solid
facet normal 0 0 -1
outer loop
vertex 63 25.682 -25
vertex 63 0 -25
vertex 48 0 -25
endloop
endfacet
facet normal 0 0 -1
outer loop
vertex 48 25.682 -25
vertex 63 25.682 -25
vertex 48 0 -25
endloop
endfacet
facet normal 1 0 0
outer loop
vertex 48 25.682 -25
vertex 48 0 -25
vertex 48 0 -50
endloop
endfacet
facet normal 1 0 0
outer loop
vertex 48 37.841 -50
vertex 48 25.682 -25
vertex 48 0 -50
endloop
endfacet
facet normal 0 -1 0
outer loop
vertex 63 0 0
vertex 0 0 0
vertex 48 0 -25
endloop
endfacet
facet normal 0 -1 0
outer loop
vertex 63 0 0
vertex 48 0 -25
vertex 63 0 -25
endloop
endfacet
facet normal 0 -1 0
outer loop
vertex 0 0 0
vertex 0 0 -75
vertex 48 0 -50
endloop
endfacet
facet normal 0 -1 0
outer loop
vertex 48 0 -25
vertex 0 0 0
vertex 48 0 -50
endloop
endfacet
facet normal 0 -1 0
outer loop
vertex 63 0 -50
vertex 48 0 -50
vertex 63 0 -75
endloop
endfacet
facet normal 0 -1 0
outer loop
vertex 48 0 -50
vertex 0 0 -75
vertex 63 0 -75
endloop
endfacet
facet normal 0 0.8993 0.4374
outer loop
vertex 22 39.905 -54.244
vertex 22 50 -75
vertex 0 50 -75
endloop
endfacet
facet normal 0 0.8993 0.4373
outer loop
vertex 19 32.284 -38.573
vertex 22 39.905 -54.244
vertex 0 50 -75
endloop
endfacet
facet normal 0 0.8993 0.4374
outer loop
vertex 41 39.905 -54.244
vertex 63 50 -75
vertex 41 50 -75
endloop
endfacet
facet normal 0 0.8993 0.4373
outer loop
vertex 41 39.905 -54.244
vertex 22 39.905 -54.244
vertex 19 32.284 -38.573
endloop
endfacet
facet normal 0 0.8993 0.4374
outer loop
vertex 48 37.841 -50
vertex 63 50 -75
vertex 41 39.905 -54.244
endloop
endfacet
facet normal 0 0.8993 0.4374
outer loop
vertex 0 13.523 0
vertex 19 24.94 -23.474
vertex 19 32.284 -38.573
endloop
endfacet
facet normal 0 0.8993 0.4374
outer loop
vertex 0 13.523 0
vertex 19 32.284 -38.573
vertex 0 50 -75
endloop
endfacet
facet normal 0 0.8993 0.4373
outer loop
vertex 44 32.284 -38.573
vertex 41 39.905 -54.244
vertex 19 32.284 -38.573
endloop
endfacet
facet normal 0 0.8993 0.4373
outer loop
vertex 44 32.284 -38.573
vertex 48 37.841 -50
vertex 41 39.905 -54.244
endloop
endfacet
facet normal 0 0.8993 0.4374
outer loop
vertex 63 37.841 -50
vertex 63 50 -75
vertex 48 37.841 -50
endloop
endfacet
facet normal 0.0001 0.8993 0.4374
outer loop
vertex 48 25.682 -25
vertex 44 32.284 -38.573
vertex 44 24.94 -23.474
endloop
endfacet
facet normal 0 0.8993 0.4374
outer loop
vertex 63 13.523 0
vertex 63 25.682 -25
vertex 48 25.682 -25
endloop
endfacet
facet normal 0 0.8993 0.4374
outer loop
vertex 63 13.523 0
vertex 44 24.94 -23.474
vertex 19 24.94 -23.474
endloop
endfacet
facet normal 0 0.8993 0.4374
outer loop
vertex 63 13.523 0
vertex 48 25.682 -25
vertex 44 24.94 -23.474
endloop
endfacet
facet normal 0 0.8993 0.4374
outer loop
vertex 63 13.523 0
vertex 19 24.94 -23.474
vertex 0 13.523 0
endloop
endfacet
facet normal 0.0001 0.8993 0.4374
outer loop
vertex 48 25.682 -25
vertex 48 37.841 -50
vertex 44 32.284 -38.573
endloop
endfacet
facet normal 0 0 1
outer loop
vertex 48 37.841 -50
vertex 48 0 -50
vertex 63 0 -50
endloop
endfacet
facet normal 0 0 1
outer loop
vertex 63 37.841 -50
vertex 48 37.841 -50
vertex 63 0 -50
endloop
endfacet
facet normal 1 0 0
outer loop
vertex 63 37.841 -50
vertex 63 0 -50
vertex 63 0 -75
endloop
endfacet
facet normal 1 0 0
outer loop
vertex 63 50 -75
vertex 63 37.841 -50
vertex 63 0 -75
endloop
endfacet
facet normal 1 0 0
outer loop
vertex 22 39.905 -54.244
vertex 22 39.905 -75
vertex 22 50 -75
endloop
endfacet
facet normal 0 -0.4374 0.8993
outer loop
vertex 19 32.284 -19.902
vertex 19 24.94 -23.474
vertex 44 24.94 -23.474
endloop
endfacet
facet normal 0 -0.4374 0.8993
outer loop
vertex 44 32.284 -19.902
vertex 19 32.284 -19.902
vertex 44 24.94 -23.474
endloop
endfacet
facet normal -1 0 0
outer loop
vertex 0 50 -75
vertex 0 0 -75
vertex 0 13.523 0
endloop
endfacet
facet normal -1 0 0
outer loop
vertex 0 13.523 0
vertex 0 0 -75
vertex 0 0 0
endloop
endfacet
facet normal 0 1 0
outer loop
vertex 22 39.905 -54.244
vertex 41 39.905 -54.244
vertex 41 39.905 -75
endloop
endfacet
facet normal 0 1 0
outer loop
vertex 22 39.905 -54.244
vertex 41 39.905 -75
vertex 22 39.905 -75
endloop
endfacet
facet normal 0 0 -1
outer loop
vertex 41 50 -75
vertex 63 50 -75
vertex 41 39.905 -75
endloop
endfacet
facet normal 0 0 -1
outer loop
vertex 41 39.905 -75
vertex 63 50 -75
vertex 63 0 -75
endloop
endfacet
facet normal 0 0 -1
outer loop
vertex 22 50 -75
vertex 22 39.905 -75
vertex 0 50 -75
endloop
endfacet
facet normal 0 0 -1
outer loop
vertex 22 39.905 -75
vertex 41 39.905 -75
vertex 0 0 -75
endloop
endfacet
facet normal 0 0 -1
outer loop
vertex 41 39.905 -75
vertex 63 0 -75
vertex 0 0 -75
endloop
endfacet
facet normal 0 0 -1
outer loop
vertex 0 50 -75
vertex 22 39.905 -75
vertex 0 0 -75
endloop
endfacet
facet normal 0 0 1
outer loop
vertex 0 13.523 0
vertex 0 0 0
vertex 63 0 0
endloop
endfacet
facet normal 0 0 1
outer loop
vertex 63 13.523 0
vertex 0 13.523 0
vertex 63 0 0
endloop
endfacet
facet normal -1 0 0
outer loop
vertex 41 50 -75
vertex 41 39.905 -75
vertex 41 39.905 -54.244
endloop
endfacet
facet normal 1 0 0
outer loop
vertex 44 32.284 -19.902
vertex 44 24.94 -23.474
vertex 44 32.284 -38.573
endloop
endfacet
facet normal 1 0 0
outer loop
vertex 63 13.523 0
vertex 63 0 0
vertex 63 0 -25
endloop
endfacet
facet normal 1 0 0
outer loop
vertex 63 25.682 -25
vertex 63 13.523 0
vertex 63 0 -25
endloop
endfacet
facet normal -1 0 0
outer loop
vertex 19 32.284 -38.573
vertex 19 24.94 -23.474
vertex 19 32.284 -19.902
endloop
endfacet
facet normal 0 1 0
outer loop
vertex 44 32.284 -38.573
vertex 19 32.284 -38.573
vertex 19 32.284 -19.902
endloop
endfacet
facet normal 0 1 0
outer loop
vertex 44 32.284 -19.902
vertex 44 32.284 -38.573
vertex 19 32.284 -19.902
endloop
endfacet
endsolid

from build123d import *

# Parameters (mm, degrees)
BOSS_EXTRUDE2_DEPTH = 50
CUT_EXTRUDE2_DEPTH  = 63
SKETCH6_W           = 25
SKETCH6_H           = 16.790562981
BOSS_EXTRUDE4_DEPTH = 16
CUT_EXTRUDE8_DEPTH  = 25
SKETCH11_W          = 19
SKETCH11_H          = 10.094840621
CUT_EXTRUDE9_DEPTH  = 25


with BuildPart() as part:
    # Sketch1 → Boss-Extrude2 (new body)
    with BuildSketch(Plane(origin=(0, 0, 0), x_dir=(1, 0, 0), z_dir=(0, 1, 0))):
        Polygon((0, 0), (63, 0), (63, 25), (48, 25), (48, 50), (63, 50), (63, 75), (0, 75), align=None)
    extrude(amount=BOSS_EXTRUDE2_DEPTH)

    # Sketch3 → Cut-Extrude2 (cut)
    with BuildSketch(Plane(origin=(63, 0, 0), x_dir=(0, 0, -1), z_dir=(1, 0, 0))):
        Polygon((75, 50), (0, 13.523152522), (0, 50), align=None)
    extrude(amount=-CUT_EXTRUDE2_DEPTH, mode=Mode.SUBTRACT)

    # Sketch6 → Boss-Extrude4 (add)
    with BuildSketch(Plane(origin=(0, 10.936247914, 5.318931295), x_dir=(1, 0, 0), z_dir=(0, 0.8992805495570562, 0.437372259280763))):
        with Locations((31.5, 40.412961178)):
            Rectangle(SKETCH6_W, SKETCH6_H)
    extrude(amount=BOSS_EXTRUDE4_DEPTH)

    # Sketch10 → Cut-Extrude8 (cut)
    with BuildSketch(Plane(origin=(44, 0, 0), x_dir=(0, 0, -1), z_dir=(1, 0, 0))):
        Polygon((38.573371995, 32.283619282), (19.90226542, 32.283619282), (16.475989141, 39.328381609), (31.575415847, 46.672108075), align=None)
    extrude(amount=-CUT_EXTRUDE8_DEPTH, mode=Mode.SUBTRACT)

    # Sketch11 → Cut-Extrude9 (cut)
    with BuildSketch(Plane(origin=(0, 0, -75), x_dir=(-1, 0, 0), z_dir=(0, 0, -1))):
        with Locations((-31.5, 44.952579689)):
            Rectangle(SKETCH11_W, SKETCH11_H)
    extrude(amount=-CUT_EXTRUDE9_DEPTH, mode=Mode.SUBTRACT)


solid = part.part
